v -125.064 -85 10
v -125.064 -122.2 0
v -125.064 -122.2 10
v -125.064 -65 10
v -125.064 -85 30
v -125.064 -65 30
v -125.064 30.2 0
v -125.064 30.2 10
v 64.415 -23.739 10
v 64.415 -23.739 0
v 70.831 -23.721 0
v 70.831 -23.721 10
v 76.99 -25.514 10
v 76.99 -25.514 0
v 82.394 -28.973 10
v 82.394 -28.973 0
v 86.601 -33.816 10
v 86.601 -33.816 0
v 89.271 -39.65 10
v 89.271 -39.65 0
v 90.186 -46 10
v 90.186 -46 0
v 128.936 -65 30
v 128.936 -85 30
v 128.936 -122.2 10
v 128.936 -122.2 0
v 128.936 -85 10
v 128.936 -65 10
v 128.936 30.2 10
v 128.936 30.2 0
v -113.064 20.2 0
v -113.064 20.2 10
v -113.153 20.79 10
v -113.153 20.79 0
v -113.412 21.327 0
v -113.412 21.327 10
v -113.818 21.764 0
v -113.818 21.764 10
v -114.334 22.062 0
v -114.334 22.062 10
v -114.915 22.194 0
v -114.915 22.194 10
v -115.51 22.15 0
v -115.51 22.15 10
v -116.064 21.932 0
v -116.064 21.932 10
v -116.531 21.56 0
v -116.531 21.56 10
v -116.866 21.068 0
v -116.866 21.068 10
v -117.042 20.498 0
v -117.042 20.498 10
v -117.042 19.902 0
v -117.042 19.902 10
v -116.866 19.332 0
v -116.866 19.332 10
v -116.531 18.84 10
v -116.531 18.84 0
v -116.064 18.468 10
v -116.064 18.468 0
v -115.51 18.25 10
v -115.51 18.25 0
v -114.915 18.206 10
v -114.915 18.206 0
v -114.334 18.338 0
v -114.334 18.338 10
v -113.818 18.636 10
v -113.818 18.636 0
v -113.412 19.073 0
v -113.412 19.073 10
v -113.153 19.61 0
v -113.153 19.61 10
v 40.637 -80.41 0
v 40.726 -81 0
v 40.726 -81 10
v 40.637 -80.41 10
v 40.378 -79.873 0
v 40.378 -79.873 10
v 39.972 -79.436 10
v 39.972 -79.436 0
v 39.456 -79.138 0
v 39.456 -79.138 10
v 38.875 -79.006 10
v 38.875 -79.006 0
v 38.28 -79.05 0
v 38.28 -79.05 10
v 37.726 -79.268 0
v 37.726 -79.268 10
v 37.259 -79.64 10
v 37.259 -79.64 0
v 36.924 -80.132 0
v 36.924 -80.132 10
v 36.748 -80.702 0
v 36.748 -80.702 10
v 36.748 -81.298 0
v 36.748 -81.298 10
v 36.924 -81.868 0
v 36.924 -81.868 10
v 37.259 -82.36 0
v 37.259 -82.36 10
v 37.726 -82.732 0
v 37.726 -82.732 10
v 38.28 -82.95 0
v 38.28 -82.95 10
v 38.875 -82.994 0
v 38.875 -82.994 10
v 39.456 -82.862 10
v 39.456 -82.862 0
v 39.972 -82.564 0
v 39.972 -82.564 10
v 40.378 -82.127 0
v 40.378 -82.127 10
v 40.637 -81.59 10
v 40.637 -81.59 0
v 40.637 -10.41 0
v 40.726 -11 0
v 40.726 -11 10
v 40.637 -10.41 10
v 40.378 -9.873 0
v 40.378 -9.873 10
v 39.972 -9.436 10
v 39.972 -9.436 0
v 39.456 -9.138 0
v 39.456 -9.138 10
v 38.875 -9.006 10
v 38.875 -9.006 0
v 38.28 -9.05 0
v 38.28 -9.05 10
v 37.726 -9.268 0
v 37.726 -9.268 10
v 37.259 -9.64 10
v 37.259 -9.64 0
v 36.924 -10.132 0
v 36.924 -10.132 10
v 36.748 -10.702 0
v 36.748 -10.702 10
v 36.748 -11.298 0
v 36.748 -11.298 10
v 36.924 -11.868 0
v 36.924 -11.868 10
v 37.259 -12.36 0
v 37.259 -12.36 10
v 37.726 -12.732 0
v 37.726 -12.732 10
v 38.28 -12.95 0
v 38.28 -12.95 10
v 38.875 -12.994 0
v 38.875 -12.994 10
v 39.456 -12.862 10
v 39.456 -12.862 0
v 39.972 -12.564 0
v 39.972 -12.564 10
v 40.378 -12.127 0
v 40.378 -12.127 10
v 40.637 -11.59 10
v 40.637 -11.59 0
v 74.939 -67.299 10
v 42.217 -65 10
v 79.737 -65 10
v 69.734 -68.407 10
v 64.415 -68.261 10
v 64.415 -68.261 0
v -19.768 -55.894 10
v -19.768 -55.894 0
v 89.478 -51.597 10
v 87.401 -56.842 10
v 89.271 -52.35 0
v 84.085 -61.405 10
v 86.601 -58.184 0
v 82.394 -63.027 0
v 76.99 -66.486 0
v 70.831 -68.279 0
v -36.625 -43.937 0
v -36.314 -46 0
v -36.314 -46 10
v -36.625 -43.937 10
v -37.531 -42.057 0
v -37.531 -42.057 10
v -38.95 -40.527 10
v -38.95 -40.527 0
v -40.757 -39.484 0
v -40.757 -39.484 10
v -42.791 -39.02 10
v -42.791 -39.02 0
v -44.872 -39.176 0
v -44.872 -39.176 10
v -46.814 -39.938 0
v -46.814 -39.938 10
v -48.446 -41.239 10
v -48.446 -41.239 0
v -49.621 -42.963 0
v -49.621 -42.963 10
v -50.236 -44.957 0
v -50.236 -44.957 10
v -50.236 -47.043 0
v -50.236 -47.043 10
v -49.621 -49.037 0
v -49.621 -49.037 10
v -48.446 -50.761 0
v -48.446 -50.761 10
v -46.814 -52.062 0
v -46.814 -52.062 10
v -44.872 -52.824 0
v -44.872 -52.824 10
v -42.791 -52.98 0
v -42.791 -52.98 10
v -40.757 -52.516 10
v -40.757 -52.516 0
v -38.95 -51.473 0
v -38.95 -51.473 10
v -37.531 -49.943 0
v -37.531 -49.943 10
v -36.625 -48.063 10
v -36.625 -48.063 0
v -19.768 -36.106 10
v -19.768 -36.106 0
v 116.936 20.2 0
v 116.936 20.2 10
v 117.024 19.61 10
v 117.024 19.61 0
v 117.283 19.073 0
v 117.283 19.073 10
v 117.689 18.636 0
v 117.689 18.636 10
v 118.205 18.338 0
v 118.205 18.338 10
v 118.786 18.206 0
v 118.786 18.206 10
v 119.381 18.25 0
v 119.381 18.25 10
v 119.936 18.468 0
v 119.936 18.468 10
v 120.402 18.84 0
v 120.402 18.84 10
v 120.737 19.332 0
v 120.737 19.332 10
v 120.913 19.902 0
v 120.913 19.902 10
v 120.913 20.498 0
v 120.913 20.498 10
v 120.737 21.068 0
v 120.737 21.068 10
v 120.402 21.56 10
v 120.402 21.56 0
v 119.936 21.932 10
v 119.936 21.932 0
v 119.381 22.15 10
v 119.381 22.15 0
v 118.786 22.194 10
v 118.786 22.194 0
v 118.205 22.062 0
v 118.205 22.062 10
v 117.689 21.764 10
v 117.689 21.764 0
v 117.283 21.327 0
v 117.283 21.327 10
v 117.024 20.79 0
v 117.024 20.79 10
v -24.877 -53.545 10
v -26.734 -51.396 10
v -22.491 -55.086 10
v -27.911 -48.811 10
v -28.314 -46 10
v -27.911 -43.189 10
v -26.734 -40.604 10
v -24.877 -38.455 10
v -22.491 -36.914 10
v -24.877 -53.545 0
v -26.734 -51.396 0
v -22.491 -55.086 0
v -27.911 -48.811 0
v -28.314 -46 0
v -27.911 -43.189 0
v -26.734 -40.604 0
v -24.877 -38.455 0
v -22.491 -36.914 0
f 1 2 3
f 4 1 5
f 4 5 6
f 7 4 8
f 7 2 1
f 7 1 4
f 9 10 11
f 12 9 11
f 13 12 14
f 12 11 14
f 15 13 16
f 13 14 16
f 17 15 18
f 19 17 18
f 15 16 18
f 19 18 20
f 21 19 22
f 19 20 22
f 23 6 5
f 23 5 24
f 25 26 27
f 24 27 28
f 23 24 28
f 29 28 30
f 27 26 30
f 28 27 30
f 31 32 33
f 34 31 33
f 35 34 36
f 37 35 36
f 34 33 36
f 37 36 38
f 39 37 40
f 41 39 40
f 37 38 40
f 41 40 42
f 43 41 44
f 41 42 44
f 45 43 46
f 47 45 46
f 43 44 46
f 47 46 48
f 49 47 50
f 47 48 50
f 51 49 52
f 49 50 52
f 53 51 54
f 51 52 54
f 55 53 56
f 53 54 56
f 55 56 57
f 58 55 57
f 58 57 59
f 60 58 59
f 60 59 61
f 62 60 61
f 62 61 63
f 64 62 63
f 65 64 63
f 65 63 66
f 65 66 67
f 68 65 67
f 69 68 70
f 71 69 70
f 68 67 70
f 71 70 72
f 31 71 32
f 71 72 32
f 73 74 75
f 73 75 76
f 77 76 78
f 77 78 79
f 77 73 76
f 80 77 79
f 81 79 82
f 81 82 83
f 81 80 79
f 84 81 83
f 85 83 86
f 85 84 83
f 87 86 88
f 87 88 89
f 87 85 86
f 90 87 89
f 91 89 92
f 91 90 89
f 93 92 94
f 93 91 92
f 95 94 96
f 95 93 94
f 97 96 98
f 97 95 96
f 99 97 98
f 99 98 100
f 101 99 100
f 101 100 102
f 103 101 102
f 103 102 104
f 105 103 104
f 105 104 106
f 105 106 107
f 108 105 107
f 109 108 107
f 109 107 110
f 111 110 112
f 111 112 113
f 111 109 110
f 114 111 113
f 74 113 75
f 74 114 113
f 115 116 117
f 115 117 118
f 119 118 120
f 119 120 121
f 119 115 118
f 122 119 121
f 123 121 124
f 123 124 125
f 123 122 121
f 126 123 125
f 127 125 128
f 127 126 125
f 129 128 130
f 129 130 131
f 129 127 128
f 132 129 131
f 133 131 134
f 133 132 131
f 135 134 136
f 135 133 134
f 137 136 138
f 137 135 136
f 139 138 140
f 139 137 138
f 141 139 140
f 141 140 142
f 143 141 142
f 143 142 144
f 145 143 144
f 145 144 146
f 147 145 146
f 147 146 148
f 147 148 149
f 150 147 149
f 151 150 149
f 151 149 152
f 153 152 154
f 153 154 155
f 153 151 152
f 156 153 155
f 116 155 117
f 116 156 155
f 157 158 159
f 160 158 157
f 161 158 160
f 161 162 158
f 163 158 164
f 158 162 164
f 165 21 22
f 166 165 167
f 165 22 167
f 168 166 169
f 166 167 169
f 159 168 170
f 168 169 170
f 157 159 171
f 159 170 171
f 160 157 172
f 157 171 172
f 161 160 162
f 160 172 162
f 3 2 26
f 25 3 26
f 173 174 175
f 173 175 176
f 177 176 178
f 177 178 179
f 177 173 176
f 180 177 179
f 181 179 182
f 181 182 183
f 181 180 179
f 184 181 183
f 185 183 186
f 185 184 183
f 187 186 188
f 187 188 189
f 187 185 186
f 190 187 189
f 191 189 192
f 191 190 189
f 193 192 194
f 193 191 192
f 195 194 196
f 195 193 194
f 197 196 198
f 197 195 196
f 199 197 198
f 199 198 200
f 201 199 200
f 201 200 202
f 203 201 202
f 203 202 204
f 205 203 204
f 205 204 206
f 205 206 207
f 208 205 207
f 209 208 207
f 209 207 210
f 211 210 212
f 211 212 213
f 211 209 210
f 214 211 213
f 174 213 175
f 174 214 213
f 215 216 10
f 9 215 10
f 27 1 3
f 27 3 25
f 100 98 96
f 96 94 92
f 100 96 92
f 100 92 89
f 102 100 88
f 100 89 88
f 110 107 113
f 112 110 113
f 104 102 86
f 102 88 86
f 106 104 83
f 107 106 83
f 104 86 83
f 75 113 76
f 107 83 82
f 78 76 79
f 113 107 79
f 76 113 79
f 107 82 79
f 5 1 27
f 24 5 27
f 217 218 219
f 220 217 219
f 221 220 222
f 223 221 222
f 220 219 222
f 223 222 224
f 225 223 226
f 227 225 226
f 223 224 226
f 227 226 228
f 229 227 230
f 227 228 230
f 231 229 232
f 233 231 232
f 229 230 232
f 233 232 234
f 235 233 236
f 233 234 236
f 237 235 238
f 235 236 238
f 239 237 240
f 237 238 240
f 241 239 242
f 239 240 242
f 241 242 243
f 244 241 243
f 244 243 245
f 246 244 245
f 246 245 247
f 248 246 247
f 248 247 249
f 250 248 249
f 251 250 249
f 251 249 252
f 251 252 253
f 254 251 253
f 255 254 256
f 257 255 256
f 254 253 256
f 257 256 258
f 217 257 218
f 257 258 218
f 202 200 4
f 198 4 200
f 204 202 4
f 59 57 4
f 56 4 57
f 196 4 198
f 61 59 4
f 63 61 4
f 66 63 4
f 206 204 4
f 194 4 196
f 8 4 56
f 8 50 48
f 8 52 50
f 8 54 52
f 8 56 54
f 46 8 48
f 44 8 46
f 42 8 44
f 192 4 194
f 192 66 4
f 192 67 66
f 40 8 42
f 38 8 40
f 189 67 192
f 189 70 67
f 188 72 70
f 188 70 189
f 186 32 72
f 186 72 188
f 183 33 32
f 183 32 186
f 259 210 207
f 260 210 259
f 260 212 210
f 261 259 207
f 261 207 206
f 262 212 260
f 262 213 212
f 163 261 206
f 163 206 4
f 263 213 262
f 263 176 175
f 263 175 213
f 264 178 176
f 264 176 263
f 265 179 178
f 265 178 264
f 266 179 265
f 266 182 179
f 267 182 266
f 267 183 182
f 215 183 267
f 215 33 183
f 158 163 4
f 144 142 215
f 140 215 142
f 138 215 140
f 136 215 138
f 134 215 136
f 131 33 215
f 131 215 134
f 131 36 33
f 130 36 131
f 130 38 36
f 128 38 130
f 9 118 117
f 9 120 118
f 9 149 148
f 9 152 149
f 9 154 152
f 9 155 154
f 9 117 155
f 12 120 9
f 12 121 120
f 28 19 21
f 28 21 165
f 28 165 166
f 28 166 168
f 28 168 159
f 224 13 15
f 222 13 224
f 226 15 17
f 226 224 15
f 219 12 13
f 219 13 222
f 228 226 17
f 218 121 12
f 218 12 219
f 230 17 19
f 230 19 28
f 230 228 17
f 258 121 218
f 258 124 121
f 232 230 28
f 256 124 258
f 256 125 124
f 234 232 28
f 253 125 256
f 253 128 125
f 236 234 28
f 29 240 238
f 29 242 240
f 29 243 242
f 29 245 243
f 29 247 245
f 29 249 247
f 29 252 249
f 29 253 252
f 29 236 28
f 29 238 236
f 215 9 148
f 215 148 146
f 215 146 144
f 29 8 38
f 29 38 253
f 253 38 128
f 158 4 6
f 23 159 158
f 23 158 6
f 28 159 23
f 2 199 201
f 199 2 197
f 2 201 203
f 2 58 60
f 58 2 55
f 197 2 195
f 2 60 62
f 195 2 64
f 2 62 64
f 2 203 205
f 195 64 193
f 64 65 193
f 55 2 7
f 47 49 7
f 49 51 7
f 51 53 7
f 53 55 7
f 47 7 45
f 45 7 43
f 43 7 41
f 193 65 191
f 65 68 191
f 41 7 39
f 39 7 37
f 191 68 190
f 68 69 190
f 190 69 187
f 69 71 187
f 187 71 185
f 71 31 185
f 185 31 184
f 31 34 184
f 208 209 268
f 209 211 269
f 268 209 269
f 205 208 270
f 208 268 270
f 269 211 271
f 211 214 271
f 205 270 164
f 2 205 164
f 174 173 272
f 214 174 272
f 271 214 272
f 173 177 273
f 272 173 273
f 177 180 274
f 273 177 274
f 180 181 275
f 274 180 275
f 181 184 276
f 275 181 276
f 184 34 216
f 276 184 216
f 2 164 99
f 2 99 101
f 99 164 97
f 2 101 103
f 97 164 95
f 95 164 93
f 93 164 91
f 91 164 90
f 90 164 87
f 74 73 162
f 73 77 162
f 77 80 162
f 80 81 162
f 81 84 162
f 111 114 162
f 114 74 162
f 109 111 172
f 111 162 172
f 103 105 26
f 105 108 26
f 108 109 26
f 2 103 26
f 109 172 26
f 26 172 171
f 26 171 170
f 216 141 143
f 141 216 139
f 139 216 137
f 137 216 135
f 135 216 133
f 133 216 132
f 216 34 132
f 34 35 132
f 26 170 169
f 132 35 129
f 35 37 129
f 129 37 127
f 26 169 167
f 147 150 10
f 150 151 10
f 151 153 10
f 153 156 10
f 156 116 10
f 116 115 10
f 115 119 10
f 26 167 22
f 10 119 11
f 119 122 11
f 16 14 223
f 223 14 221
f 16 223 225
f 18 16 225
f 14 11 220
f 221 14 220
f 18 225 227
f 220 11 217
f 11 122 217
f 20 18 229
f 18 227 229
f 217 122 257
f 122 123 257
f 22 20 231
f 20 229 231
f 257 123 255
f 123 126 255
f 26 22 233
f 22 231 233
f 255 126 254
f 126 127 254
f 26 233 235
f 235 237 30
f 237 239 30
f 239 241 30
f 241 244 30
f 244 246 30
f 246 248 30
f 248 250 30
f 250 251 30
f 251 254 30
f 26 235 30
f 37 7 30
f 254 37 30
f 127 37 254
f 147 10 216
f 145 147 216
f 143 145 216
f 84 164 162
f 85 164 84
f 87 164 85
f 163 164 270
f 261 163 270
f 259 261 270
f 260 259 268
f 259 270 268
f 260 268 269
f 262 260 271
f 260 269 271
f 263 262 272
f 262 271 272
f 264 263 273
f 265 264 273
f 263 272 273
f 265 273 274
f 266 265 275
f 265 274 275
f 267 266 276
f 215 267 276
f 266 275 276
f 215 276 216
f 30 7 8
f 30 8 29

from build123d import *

# Parameters (mm, degrees)
CROQUIS1_W              = 254
CROQUIS1_H              = 152.4
CROQUIS1_R              = 2
CROQUIS1_R_2            = 7
SALIENTE_EXTRUIR1_DEPTH = 10
CROQUIS2_R              = 2
CORTAR_EXTRUIR1_DEPTH   = 10
CROQUIS3_W              = 254
CROQUIS3_H              = 20
SALIENTE_EXTRUIR2_DEPTH = 20


with BuildPart() as part:
    # Croquis1 → Saliente-Extruir1 (new body)
    with BuildSketch(Plane.XY):
        with Locations((1.935502346, -46)):
            Rectangle(CROQUIS1_W, CROQUIS1_H)
        with Locations((38.725502346, -81)):
            Circle(CROQUIS1_R, mode=Mode.SUBTRACT)
        with Locations((-43.314497654, -46)):
            Circle(CROQUIS1_R_2, mode=Mode.SUBTRACT)
        with BuildLine():
            Line((-19.767986026, -36.106195294), (64.415153509, -23.738939412))
            ThreePointArc((64.415153509, -23.738939412), (82.393784897, -28.973067674), (90.185502346, -46))
            ThreePointArc((90.185502346, -46), (82.393784897, -63.026932326), (64.415153509, -68.261060588))
            Line((64.415153509, -68.261060588), (-19.767986026, -55.893804706))
            ThreePointArc((-19.767986026, -55.893804706), (-28.314497654, -46), (-19.767986026, -36.106195294))
        make_face(mode=Mode.SUBTRACT)
        with Locations((38.725502346, -11)):
            Circle(CROQUIS1_R, mode=Mode.SUBTRACT)
    extrude(amount=SALIENTE_EXTRUIR1_DEPTH)

    # Croquis2 → Cortar-Extruir1 (cut)
    with BuildSketch(Plane.XY.offset(10)):
        with Locations((-115.064497654, 20.2)):
            Circle(CROQUIS2_R)
        with Locations(Location((118.935502346, 20.2, 0), (0, 0, 180))):
            Circle(CROQUIS2_R)
    extrude(amount=-CORTAR_EXTRUIR1_DEPTH, mode=Mode.SUBTRACT)

    # Croquis3 → Saliente-Extruir2 (add)
    with BuildSketch(Plane.XY.offset(10)):
        with Locations((1.935502346, -75)):
            Rectangle(CROQUIS3_W, CROQUIS3_H)
    extrude(amount=SALIENTE_EXTRUIR2_DEPTH)


solid = part.part
